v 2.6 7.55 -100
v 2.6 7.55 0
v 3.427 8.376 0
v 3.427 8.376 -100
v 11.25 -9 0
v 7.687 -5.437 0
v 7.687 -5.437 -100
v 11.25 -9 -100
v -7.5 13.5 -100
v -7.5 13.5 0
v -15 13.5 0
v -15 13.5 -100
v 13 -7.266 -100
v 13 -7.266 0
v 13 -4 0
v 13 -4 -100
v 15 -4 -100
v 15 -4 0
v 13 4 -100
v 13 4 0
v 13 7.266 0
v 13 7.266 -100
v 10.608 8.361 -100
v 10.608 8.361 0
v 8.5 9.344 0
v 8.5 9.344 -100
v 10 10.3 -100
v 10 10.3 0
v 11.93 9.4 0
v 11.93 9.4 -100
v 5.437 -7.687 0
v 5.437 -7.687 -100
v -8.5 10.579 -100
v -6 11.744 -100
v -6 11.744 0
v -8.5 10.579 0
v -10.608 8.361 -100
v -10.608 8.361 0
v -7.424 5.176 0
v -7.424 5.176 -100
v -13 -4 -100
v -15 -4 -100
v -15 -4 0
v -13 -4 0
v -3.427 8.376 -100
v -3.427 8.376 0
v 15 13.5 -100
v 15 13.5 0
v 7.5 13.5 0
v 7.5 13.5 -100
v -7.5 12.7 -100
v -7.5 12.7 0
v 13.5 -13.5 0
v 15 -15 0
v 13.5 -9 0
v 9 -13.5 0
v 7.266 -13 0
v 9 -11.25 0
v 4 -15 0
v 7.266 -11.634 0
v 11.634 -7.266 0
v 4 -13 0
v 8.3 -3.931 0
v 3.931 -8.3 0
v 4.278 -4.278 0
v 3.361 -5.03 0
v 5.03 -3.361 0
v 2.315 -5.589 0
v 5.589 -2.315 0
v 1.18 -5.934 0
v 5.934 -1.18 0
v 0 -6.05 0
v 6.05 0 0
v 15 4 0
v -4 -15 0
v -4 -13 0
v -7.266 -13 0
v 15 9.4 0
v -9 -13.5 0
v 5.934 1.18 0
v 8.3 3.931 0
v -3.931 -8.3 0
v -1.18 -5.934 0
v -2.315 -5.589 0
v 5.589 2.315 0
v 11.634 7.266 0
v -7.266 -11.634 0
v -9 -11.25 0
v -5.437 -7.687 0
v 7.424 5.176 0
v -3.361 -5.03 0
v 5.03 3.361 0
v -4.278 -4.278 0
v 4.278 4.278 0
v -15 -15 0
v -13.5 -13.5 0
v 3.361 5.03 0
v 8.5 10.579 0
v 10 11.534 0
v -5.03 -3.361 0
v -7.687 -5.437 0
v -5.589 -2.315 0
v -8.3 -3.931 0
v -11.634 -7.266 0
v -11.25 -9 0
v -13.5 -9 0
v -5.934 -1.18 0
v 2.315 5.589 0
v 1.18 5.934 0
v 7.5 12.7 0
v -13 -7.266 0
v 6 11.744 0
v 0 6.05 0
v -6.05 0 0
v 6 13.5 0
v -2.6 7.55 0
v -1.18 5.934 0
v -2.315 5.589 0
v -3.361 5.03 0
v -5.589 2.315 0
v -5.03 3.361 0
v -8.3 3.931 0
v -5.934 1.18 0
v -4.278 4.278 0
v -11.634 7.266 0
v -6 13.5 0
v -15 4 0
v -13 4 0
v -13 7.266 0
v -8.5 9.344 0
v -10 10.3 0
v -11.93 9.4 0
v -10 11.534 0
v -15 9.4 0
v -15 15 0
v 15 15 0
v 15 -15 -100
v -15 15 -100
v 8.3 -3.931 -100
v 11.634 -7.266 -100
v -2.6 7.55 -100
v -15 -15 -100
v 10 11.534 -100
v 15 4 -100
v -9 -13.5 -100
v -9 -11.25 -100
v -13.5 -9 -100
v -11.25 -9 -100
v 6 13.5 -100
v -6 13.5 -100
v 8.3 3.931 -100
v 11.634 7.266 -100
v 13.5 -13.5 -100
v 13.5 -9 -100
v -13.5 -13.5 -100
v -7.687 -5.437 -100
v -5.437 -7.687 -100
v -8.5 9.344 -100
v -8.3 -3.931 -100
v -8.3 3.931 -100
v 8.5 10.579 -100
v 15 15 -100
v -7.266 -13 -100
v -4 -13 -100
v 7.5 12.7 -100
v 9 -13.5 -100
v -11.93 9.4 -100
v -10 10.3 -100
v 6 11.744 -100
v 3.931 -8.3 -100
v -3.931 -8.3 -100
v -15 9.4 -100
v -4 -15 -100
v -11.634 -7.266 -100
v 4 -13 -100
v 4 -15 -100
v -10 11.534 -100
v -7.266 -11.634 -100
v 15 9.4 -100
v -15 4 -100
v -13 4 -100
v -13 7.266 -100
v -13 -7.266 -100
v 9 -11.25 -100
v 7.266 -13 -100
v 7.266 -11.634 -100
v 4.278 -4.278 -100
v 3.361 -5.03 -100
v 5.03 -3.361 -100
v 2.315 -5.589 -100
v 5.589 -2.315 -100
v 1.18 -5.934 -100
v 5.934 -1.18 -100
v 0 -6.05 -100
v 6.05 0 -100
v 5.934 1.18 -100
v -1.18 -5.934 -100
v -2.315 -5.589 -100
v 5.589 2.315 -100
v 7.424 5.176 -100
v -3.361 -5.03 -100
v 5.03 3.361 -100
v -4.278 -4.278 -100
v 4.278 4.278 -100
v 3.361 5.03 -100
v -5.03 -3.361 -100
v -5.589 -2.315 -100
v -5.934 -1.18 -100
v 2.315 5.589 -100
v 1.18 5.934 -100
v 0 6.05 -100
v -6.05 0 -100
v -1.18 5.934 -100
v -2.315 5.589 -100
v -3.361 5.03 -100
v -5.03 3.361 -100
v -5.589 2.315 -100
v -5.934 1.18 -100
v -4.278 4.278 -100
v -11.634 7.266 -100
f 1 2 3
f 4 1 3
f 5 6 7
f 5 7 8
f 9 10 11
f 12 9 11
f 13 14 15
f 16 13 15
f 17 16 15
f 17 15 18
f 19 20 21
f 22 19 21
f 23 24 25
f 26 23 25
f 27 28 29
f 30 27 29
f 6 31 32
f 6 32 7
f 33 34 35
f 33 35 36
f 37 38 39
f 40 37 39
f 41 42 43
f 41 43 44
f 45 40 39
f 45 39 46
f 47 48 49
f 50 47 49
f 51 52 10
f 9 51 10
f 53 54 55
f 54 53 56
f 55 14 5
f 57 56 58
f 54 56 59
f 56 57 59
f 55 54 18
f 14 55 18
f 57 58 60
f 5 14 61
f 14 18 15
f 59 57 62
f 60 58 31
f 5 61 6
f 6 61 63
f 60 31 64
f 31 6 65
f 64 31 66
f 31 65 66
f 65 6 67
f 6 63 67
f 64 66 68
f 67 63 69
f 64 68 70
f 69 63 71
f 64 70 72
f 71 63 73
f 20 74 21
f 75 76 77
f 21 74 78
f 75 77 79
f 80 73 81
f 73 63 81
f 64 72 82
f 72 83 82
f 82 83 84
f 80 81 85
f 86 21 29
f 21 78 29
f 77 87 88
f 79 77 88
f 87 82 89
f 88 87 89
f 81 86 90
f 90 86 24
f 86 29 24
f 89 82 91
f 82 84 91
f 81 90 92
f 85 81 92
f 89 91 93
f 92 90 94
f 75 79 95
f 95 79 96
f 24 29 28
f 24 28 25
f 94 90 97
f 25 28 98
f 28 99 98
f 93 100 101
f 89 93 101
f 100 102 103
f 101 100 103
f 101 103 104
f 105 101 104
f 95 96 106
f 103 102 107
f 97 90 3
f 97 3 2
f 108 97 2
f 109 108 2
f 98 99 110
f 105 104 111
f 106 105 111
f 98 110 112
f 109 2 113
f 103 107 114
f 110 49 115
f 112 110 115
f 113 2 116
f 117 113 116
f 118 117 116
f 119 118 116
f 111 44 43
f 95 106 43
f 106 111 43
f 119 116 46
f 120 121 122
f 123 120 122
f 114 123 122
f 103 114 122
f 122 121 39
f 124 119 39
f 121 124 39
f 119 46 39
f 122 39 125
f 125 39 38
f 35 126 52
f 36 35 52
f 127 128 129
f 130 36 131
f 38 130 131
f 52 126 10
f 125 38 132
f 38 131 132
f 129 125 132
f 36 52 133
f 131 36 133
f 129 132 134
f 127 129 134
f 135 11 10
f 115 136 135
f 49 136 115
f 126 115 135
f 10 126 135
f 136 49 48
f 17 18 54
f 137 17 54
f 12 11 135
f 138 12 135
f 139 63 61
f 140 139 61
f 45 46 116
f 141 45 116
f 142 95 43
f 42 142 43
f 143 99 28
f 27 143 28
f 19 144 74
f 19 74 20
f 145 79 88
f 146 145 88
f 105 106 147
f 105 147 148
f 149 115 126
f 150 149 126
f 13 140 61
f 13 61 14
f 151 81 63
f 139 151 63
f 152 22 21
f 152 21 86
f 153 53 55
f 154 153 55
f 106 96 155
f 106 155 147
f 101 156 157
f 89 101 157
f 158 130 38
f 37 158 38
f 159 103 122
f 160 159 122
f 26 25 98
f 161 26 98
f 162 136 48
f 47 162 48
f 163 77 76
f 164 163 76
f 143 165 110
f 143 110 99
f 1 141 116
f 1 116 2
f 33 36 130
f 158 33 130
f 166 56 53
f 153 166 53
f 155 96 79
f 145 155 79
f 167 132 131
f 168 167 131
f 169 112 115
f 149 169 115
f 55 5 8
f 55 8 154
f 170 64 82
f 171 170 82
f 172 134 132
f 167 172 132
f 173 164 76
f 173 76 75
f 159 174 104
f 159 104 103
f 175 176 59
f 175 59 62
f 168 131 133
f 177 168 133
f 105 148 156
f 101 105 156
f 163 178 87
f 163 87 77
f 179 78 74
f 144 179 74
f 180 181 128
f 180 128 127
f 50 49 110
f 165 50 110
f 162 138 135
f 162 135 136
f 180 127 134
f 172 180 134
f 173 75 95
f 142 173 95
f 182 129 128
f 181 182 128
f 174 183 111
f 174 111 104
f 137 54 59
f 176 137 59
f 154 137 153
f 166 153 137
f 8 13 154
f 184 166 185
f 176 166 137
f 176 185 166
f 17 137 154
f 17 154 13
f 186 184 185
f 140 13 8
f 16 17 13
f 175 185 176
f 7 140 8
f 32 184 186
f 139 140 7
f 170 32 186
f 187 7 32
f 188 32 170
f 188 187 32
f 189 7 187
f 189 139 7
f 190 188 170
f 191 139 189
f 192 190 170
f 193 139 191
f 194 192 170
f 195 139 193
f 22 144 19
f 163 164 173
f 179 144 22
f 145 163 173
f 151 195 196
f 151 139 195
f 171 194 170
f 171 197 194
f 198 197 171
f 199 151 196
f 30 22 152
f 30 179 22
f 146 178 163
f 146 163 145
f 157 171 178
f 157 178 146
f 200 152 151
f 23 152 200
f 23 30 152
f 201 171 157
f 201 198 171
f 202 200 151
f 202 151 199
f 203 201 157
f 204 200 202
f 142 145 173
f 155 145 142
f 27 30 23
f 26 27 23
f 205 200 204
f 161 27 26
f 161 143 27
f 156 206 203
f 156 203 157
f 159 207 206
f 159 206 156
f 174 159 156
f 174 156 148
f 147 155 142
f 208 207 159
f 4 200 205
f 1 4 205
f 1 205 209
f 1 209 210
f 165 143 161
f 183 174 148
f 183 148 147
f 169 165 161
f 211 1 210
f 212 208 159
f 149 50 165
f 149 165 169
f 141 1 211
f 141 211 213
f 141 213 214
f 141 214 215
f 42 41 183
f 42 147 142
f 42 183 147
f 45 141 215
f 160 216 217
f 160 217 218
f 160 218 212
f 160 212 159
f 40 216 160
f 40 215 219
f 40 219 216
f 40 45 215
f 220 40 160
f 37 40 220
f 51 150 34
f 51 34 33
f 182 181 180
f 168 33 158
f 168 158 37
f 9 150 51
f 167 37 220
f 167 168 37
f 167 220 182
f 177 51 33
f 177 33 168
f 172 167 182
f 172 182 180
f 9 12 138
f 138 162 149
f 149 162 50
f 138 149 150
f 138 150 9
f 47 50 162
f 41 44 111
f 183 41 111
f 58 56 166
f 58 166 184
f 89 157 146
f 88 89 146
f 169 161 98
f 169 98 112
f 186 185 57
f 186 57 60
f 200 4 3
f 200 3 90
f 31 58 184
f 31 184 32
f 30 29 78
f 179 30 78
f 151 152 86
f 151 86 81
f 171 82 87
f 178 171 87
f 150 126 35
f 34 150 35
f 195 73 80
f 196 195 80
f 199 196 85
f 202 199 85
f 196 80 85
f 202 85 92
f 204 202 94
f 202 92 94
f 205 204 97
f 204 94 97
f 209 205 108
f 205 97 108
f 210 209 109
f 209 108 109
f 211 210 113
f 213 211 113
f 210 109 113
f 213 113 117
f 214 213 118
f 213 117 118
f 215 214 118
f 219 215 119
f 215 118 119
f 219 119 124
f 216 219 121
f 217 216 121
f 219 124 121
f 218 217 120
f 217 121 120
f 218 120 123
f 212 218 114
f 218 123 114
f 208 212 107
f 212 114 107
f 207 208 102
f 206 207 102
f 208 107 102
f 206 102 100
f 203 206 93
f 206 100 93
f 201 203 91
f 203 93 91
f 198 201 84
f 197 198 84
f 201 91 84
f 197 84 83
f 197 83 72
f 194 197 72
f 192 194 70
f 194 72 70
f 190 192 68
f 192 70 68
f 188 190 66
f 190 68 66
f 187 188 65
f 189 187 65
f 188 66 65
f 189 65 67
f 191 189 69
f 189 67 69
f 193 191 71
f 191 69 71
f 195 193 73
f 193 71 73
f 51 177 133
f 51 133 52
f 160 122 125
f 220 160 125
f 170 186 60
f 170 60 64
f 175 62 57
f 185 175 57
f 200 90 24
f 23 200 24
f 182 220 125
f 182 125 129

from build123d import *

# Parameters (mm, degrees)
SKETCH1_R          = 6.05
SKETCH1_W          = 4.5
SKETCH1_H          = 4.5
EXTRUDE1_DEPTH     = 100
CUT_EXTRUDE1_DEPTH = 101
CIRPATTERN1_COUNT  = 2
CIRPATTERN1_ANGLE  = 90


with BuildPart() as part:
    # Sketch1 → Extrude1 (new body)
    with BuildSketch(Plane.XY):
        Polygon((13, 7.265685), (11.634315, 7.265685), (8.3, 3.931371213), (8.3, -3.931371213), (11.634315, -7.265685), (13, -7.265685), (13, -4), (15, -4), (15, -15), (4, -15), (4, -13), (7.265685, -13), (7.265685, -11.634315), (3.931371213, -8.3), (-3.931371213, -8.3), (-7.265685, -11.634315), (-7.265685, -13), (-4, -13), (-4, -15), (-15, -15), (-15, -4), (-13, -4), (-13, -7.265685), (-11.634315, -7.265685), (-8.3, -3.931371213), (-8.3, 3.931371213), (-11.634315, 7.265685), (-13, 7.265685), (-13, 4), (-15, 4), (-15, 9.399999971), (-11.93005553, 9.399999971), (-9.99999999, 10.299999926), (-9.99999999, 11.534231082), (-7.49999999, 12.69999986), (-7.49999999, 13.499999971), (-14.999999992, 13.499999971), (-14.999999992, 15), (14.99999999, 15), (14.99999999, 13.499999971), (7.49999999, 13.499999971), (7.49999999, 12.69999986), (9.99999999, 11.534231082), (9.99999999, 10.299999926), (11.93005553, 9.399999971), (15, 9.399999971), (15, 4), (13, 4), align=None)
        Circle(SKETCH1_R, mode=Mode.SUBTRACT)
        Polygon((-8.5, 10.5786251), (-8.5, 9.344394771), (-10.60849553, 8.361187544), (-7.423547516, 5.176238259), (-3.426503445, 8.376249899), (-2.600251667, 7.55), (2.600251667, 7.55), (3.426503445, 8.376249899), (7.423547516, 5.176238259), (10.60849553, 8.361187544), (8.5, 9.344394771), (8.5, 10.5786251), (6, 11.7443949), (6, 13.5), (-6, 13.5), (-6, 11.7443949), align=None, mode=Mode.SUBTRACT)
        with Locations((-11.25, -11.25)):
            Rectangle(SKETCH1_W, SKETCH1_H, mode=Mode.SUBTRACT)
        with Locations((11.25, -11.25)):
            Rectangle(SKETCH1_W, SKETCH1_H, mode=Mode.SUBTRACT)
    extrude(amount=-EXTRUDE1_DEPTH)

    # Sketch2 → Cut-Extrude1 (cut, through all)
    with BuildSketch(Plane.XY):
        Polygon((-11.25, -9), (-7.686853797, -5.436853797), (-5.436853797, -7.686853797), (-9, -11.25), align=None)
    cut_extrude1 = extrude(amount=-CUT_EXTRUDE1_DEPTH, mode=Mode.SUBTRACT)

    # CirPattern1: Cut-Extrude1 ×2 about axis
    cirpattern1_axis = Axis((0, 0, 0), (0, 0, 1))
    for i in range(1, CIRPATTERN1_COUNT):
        add(cut_extrude1.rotate(cirpattern1_axis, i * CIRPATTERN1_ANGLE / (CIRPATTERN1_COUNT - 1)), mode=Mode.SUBTRACT)


solid = part.part
